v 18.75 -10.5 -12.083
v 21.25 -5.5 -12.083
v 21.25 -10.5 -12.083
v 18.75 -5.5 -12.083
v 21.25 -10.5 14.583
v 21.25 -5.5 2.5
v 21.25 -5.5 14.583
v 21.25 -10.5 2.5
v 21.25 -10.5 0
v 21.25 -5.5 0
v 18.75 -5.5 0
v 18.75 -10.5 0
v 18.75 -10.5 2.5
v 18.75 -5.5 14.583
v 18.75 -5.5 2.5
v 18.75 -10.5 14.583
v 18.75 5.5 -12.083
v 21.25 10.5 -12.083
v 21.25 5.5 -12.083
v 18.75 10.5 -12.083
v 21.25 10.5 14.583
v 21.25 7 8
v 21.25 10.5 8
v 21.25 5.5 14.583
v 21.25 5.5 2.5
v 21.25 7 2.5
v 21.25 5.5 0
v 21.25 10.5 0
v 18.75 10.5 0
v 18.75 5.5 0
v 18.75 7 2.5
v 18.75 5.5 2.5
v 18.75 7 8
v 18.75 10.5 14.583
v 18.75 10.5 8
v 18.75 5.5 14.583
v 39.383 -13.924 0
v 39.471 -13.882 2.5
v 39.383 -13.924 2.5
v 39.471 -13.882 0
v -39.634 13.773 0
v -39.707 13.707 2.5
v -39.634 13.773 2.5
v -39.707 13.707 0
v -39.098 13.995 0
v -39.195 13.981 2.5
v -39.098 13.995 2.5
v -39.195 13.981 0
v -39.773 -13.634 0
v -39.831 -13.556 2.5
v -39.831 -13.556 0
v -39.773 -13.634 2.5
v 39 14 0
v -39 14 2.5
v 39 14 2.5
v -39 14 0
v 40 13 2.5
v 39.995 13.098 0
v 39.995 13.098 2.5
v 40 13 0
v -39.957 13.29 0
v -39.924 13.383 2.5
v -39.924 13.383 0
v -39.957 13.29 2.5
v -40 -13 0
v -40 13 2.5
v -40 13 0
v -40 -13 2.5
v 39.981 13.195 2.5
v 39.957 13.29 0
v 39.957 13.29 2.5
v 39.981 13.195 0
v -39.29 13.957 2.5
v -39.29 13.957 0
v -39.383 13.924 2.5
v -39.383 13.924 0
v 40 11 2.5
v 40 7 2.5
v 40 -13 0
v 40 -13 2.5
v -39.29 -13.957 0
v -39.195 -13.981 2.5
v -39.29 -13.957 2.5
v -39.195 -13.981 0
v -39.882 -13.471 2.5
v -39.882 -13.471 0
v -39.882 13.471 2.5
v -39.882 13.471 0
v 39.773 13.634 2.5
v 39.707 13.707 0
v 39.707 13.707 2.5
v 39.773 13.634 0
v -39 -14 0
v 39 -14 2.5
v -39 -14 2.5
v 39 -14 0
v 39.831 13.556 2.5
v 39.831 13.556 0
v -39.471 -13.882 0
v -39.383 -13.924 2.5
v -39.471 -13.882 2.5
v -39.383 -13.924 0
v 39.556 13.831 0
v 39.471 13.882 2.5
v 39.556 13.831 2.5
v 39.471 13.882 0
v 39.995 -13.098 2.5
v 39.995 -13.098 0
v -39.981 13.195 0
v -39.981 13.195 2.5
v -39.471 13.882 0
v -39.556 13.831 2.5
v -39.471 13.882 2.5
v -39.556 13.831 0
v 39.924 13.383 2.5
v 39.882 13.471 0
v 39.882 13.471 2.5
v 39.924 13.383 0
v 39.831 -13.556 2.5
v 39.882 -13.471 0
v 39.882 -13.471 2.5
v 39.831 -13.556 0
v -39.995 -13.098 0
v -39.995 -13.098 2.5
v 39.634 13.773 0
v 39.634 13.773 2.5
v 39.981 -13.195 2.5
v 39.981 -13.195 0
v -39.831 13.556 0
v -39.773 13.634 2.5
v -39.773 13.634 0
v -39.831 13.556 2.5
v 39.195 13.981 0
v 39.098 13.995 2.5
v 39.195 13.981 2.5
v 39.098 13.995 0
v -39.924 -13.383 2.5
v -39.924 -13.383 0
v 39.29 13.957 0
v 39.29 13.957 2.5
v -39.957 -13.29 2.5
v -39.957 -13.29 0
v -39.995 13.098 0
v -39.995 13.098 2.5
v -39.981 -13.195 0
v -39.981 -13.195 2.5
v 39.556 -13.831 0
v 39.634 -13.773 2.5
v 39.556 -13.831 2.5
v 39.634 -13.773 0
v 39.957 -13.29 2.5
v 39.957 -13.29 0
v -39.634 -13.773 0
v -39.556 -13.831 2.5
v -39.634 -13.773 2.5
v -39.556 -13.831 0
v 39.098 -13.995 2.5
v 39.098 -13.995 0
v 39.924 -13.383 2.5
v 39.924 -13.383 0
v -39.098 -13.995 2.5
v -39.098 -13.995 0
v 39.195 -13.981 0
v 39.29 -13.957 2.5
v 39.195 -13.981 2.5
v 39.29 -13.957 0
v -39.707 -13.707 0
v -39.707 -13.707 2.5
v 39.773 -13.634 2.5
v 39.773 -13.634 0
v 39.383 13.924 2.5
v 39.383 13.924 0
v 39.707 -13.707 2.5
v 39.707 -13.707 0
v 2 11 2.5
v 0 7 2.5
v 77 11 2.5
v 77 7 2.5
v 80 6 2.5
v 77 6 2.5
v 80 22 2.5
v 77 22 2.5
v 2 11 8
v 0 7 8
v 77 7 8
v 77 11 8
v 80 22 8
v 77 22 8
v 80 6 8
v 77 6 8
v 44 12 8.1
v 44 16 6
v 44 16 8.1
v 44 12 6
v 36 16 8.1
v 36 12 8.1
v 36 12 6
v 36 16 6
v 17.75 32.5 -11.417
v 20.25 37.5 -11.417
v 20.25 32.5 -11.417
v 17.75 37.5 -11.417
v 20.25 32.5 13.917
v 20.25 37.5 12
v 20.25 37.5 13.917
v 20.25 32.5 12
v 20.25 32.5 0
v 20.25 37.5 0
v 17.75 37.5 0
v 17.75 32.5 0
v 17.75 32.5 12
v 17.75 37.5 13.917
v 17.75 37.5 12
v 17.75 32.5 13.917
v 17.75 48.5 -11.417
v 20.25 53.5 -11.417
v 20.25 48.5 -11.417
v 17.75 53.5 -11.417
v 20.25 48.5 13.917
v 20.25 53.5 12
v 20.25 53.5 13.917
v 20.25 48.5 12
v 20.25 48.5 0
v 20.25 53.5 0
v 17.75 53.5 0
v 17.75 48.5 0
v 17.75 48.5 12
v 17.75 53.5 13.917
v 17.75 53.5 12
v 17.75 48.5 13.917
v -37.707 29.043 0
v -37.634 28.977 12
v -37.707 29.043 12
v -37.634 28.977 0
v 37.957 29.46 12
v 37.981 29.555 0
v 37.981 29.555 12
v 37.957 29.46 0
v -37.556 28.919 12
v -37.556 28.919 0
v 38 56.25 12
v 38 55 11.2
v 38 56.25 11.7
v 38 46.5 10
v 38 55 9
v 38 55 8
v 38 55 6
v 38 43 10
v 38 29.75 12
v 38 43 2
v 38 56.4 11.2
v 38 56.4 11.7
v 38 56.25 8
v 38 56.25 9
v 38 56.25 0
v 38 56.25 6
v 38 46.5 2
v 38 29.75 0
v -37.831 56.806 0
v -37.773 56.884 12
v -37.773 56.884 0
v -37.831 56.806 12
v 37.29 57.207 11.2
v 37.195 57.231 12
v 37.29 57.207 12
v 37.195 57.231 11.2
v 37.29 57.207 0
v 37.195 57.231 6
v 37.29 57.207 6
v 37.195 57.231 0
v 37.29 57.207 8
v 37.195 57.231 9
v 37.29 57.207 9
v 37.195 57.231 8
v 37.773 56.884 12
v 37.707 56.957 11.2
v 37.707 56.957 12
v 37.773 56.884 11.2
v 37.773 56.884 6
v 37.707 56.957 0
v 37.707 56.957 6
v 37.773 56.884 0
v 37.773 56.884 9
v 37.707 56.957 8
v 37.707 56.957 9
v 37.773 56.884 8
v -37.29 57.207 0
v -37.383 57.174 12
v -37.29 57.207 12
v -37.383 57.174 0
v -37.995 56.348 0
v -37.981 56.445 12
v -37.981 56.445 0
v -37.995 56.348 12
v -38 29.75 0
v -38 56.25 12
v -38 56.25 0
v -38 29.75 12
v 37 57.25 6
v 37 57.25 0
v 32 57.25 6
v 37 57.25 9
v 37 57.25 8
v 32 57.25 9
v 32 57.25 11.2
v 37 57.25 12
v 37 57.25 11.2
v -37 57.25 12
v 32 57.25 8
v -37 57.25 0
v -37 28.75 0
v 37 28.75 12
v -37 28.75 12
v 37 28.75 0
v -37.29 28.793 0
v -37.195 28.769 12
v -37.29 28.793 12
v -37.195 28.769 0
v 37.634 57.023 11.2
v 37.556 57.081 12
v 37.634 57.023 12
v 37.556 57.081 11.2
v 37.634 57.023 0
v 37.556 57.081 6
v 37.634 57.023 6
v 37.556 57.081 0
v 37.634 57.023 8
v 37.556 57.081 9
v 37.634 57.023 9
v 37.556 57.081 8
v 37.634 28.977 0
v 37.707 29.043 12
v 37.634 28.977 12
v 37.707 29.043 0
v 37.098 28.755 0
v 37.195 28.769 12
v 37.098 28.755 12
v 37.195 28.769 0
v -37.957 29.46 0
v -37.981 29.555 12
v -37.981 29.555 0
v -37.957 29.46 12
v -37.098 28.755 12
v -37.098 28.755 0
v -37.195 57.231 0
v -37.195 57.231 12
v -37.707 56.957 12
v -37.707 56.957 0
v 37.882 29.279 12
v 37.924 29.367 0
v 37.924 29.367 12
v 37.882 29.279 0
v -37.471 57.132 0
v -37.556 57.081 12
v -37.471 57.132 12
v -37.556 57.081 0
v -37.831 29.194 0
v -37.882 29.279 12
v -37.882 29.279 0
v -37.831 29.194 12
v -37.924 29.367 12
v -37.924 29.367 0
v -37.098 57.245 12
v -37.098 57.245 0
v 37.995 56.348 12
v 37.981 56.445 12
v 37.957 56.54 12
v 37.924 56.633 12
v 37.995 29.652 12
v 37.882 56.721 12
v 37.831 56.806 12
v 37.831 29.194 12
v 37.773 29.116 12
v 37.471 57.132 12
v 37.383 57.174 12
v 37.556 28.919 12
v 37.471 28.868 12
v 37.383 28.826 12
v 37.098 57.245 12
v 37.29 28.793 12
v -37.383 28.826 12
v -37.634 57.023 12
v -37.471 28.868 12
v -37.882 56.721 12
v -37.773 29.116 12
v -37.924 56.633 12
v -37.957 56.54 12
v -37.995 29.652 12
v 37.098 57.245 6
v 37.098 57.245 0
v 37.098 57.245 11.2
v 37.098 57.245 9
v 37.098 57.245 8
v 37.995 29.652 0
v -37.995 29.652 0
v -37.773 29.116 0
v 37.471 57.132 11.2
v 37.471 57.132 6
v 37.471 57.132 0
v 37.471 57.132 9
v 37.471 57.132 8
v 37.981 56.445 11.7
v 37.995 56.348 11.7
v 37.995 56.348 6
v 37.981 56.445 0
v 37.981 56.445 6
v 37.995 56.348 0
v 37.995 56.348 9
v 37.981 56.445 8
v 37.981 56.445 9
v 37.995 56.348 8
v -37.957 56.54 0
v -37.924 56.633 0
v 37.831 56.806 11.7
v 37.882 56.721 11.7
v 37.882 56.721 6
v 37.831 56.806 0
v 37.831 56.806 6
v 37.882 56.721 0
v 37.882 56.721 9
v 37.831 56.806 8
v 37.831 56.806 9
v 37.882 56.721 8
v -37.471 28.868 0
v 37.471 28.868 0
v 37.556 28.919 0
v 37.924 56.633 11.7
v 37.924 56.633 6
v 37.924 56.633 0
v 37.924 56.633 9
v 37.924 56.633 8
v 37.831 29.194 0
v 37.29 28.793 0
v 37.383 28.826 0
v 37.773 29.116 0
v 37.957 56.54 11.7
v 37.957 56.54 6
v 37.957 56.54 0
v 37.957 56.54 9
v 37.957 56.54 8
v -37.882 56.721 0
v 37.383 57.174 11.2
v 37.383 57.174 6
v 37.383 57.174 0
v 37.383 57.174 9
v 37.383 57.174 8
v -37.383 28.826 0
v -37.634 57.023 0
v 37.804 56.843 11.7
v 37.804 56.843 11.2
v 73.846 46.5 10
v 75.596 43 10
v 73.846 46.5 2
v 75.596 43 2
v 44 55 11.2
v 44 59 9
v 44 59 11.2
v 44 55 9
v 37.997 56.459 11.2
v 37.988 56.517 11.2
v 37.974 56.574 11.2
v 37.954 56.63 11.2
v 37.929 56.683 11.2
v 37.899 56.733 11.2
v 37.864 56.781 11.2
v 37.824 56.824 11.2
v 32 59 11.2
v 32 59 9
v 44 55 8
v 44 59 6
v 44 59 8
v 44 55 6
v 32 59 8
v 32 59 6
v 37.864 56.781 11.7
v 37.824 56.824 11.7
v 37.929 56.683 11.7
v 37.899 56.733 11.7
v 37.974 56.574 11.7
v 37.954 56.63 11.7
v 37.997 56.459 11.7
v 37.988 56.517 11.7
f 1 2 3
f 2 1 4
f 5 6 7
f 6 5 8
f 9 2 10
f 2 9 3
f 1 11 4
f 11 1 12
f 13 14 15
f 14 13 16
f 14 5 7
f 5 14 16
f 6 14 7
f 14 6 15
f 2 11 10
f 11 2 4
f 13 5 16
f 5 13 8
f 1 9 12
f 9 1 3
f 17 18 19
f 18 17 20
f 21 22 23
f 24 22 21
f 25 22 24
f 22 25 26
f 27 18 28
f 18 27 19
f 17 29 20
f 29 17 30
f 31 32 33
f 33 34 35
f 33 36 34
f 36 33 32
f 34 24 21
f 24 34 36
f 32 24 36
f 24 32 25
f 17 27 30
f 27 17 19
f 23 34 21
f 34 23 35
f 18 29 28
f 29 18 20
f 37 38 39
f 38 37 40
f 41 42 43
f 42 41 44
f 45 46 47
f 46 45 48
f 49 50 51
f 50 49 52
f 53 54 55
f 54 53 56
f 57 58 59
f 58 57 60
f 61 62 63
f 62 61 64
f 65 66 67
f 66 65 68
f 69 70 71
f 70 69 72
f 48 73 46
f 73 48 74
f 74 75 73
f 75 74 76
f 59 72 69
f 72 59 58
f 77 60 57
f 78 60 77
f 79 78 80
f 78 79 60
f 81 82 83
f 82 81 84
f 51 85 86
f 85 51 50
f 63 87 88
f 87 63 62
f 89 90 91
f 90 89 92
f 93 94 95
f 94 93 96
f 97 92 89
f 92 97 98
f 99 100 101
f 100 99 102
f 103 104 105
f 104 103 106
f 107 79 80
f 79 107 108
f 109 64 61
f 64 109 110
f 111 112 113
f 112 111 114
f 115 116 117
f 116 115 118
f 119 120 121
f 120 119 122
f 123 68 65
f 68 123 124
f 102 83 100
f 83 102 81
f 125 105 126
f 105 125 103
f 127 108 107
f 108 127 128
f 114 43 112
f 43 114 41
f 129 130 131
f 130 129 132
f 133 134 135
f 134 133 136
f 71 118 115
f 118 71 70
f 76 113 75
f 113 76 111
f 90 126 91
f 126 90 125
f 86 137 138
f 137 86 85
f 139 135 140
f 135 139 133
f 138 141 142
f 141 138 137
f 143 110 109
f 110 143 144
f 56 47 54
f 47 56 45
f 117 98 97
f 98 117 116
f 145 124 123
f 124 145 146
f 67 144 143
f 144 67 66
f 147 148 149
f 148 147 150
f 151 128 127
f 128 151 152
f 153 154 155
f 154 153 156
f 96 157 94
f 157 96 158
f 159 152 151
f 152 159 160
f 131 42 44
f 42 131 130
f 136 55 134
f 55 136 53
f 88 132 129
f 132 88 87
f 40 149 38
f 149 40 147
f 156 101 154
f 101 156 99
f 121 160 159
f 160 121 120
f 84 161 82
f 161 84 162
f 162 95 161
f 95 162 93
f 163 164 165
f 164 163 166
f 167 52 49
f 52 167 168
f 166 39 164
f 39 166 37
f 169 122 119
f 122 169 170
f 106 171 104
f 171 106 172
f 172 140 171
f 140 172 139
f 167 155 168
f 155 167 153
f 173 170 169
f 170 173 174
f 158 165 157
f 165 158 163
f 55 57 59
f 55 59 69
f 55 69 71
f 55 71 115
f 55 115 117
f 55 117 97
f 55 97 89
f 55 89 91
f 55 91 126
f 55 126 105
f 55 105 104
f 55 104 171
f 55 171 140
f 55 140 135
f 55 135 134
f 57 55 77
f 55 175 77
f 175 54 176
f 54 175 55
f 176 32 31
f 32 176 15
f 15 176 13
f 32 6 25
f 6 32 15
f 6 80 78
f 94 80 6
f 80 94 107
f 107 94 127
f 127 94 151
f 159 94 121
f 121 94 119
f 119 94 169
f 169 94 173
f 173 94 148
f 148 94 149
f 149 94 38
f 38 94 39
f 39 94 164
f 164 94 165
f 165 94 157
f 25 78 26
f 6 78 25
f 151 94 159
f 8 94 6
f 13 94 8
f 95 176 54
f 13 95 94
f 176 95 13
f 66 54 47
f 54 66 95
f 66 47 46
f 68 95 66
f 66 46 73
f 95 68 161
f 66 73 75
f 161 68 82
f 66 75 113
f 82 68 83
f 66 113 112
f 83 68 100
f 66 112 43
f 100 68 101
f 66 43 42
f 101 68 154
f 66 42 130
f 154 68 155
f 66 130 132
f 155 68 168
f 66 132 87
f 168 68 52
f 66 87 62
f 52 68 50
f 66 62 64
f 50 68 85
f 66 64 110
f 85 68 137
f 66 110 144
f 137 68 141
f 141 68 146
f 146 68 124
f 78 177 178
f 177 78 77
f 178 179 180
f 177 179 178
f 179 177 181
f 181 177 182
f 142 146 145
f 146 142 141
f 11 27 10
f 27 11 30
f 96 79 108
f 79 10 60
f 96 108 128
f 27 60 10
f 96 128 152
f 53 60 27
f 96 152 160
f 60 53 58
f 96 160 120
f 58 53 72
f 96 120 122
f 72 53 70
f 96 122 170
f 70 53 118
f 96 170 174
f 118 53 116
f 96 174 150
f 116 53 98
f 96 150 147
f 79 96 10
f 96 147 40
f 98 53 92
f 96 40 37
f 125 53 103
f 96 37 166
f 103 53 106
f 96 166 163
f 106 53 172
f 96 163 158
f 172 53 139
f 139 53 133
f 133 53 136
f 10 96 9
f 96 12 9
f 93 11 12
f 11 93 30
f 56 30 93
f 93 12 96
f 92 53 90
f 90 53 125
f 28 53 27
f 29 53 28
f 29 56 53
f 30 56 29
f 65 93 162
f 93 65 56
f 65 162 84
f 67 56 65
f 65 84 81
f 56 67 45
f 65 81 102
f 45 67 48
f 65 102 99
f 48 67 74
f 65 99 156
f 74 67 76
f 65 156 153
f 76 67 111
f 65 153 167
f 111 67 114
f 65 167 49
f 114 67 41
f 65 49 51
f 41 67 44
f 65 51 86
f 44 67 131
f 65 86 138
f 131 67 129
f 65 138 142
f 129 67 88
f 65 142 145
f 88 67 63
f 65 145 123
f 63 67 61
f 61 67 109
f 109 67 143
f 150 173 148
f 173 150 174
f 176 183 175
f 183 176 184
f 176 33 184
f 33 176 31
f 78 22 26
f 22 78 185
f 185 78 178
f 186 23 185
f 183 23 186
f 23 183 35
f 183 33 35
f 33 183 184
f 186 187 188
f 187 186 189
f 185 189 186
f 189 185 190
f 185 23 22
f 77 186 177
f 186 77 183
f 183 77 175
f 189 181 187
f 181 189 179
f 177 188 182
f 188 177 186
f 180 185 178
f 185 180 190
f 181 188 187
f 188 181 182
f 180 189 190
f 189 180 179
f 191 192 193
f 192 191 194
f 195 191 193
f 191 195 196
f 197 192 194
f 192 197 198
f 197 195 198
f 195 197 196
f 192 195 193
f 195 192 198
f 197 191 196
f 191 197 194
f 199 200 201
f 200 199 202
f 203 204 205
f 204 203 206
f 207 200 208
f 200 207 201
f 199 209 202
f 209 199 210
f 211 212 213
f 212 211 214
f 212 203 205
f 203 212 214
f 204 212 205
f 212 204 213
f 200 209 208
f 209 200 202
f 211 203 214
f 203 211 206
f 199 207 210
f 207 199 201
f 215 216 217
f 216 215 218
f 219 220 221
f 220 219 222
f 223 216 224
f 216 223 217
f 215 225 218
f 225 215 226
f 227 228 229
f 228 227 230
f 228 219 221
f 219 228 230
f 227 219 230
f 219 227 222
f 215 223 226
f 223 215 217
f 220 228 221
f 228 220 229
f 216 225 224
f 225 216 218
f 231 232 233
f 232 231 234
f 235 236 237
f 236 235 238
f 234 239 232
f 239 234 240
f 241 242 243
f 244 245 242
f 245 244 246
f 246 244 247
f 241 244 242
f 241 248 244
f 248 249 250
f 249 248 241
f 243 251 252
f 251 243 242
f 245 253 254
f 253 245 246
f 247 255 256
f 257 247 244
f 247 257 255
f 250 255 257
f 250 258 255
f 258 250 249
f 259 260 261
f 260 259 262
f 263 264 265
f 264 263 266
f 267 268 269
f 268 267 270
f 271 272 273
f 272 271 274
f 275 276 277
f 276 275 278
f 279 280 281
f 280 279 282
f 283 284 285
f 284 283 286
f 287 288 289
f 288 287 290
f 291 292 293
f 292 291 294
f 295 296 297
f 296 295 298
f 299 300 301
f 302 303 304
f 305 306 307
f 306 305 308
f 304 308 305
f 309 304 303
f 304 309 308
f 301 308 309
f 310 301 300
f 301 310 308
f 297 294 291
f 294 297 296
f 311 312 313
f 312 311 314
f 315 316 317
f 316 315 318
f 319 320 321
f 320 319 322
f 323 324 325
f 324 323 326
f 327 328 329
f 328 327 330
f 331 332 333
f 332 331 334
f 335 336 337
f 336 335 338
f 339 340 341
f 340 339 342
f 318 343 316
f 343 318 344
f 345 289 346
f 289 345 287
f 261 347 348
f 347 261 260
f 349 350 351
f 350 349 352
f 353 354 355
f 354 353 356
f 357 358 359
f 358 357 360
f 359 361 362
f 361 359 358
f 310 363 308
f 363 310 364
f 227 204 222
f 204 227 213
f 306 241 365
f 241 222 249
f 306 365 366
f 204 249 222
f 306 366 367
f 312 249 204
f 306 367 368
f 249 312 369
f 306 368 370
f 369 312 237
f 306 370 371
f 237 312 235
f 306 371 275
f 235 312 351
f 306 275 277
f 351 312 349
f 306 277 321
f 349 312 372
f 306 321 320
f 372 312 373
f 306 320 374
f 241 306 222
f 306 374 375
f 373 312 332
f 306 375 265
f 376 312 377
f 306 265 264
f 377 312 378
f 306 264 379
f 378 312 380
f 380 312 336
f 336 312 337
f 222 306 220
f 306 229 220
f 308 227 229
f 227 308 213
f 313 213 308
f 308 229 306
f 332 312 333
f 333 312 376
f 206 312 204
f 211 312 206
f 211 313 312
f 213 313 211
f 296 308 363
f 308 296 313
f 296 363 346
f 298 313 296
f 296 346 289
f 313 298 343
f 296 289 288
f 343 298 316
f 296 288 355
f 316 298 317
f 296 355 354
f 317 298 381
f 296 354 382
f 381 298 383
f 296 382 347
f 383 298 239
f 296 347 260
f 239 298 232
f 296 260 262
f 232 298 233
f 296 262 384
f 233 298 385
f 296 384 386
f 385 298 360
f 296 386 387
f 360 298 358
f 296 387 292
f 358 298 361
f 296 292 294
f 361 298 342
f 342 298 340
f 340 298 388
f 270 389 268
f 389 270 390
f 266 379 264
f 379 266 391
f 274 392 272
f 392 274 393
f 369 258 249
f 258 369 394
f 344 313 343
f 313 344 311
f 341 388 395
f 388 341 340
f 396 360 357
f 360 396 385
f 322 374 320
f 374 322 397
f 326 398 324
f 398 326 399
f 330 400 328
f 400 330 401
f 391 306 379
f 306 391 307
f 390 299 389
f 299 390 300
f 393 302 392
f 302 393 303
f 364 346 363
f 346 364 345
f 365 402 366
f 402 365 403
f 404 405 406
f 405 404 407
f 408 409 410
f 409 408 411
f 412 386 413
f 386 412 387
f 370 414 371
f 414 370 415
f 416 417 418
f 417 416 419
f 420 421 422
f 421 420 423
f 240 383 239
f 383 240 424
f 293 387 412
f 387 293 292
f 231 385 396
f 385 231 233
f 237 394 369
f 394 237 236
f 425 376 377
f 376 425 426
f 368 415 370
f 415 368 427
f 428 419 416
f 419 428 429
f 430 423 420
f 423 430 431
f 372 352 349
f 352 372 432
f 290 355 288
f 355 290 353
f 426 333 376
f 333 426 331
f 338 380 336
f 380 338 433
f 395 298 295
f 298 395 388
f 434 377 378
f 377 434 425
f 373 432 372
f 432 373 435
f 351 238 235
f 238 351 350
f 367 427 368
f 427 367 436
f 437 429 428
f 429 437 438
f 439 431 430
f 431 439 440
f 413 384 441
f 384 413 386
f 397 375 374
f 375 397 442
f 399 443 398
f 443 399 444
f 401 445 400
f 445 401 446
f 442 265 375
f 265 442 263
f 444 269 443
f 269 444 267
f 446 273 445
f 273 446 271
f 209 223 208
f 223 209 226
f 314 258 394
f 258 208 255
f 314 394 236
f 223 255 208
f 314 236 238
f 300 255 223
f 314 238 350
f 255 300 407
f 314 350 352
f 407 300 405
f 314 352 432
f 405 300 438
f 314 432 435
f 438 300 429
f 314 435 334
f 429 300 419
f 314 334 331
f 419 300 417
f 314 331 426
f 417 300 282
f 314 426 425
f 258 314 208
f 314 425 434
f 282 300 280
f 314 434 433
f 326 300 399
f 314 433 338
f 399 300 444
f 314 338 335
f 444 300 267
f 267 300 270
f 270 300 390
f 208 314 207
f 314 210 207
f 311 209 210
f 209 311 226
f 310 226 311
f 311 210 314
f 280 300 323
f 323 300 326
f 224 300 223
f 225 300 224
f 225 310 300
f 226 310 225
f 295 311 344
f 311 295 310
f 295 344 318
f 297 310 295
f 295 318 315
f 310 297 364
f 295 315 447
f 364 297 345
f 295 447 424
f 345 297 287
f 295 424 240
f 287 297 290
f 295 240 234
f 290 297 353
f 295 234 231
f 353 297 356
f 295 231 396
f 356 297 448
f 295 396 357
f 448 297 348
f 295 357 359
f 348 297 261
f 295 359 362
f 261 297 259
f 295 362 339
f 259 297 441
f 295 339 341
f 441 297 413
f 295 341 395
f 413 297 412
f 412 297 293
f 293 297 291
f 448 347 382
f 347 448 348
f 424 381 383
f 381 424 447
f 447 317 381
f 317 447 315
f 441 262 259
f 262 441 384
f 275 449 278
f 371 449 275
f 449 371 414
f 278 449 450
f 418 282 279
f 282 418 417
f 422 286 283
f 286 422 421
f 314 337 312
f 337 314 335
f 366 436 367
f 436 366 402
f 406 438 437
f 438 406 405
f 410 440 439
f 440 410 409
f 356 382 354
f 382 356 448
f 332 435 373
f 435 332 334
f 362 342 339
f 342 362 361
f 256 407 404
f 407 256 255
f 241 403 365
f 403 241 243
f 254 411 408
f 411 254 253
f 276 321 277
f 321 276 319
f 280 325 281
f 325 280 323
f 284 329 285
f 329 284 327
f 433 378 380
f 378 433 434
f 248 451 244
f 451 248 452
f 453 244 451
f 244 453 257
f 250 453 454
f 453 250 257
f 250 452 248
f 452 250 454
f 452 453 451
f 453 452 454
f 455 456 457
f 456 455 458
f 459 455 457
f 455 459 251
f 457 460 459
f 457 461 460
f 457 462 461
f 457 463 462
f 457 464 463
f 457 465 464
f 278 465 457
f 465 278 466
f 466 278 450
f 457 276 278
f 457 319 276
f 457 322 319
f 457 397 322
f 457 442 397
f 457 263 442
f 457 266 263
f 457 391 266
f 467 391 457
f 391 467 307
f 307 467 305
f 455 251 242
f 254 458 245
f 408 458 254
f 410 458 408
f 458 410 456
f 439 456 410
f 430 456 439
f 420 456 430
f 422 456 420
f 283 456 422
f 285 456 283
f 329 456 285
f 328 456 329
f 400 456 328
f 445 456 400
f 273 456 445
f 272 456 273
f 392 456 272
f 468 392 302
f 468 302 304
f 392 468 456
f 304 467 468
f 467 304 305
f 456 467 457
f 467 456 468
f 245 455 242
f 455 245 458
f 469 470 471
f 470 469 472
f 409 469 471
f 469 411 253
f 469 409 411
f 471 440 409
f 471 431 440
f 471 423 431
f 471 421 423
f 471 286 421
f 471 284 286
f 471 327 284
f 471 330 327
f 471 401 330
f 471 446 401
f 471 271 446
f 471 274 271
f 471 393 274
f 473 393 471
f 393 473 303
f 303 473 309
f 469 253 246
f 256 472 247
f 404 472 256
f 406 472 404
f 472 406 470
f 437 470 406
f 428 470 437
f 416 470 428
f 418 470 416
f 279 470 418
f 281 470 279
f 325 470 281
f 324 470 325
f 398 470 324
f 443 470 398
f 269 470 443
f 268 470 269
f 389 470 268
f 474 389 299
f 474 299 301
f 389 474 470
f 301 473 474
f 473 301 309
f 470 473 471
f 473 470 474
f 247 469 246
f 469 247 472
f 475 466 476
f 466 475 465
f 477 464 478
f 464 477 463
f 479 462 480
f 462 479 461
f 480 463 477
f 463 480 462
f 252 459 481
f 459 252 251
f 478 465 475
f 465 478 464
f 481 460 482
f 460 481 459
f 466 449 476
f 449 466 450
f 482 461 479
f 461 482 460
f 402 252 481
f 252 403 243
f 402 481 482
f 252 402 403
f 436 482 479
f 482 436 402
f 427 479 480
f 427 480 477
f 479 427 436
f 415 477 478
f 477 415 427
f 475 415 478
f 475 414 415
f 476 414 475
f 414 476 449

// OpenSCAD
/////////////////////////////////////////////////////////////
// Fully 3D-Printable Drone Quick-Release Mount
// Version: Compact 3x4in
// Author: GPT-5 for Advaith Menon John
// Units: millimeters
/////////////////////////////////////////////////////////////

// ---------- USER SETTINGS ----------
part = "both";        // "rail", "adapter", or "both"
tolerance = 0.25;     // clearance for fit (mm)
rail_len = 80;        // overall length (≤100 mm)
rail_w   = 28;        // width (≤76 mm)
rail_h   = 8;         // total height
plate_t  = 2.5;       // base thickness
latch_th = 2.2;       // flex latch thickness
zip_slot_w = 5;       // slot width for zip ties
zip_slot_h = 2.5;     // slot height

$fn = 64;

// ---------- UTILS ----------
module rcube(x,y,z,r=1){hull(){for(dx=[-1,1])for(dy=[-1,1])
  translate([dx*(x/2-r),dy*(y/2-r),0])cylinder(r=r,h=z);}}

// ---------- MALE RAIL (Drone Side) ----------
module rail(){
  // base plate
  rcube(rail_len,rail_w,plate_t,1);
  
  // dovetail ridge
  translate([0,(rail_w-14)/2,plate_t])
    linear_extrude(height=rail_h-plate_t)
      polygon([[0,0],
               [rail_len,0],
               [rail_len-2,4],
               [2,4]]);
  
  // front stop lip
  translate([rail_len-3,(rail_w-16)/2,plate_t])
    cube([3,16,rail_h-plate_t],center=false);
  
  // latch catch window (for snap)
  translate([rail_len/2-4,rail_w/2-2,rail_h-2])
    cube([8,4,2.1],center=false);
  
  // zip-tie slots
  for(y=[-rail_w/2+6,rail_w/2-6])
    translate([rail_len/4,y,plate_t/2])
      rotate([0,90,0])
        cube([rail_len/3,zip_slot_w,zip_slot_h],center=true);
}

// ---------- FEMALE ADAPTER (Tool Side) ----------
module adapter(){
  adapter_len = rail_len-4;
  
  // outer body
  rcube(adapter_len,rail_w+2*tolerance,rail_h+4,1);
  
  // carve dovetail slot
  difference(){
    translate([0,-tolerance,2])
      linear_extrude(height=rail_h)
        offset(r=-tolerance)
          polygon([[0,0],
                   [adapter_len,0],
                   [adapter_len-2,4],
                   [2,4]]);
  }

  // flex latch tongue (springy tab)
  translate([adapter_len/2-6,rail_w/2-2,rail_h+1])
    cube([12,4,latch_th],center=false);
  
  // relief cut under latch to make it flexible
  translate([adapter_len/2-6,rail_w/2-2,rail_h-2])
    cube([12,4,2],center=false);

  // small thumb pad
  translate([adapter_len/2-4,rail_w/2-3,rail_h+latch_th])
    rcube(8,6,1.5,0.6);

  // zip-tie slots
  for(y=[-rail_w/2+6,rail_w/2-6])
    translate([adapter_len/4,y,plate_t/2])
      rotate([0,90,0])
        cube([adapter_len/3,zip_slot_w,zip_slot_h],center=true);
}

// ---------- RENDER ----------
if (part=="rail" || part=="both")
  color("silver") rail();

if (part=="adapter" || part=="both")
  translate([0,rail_w+15,0]) color("orange") adapter();
